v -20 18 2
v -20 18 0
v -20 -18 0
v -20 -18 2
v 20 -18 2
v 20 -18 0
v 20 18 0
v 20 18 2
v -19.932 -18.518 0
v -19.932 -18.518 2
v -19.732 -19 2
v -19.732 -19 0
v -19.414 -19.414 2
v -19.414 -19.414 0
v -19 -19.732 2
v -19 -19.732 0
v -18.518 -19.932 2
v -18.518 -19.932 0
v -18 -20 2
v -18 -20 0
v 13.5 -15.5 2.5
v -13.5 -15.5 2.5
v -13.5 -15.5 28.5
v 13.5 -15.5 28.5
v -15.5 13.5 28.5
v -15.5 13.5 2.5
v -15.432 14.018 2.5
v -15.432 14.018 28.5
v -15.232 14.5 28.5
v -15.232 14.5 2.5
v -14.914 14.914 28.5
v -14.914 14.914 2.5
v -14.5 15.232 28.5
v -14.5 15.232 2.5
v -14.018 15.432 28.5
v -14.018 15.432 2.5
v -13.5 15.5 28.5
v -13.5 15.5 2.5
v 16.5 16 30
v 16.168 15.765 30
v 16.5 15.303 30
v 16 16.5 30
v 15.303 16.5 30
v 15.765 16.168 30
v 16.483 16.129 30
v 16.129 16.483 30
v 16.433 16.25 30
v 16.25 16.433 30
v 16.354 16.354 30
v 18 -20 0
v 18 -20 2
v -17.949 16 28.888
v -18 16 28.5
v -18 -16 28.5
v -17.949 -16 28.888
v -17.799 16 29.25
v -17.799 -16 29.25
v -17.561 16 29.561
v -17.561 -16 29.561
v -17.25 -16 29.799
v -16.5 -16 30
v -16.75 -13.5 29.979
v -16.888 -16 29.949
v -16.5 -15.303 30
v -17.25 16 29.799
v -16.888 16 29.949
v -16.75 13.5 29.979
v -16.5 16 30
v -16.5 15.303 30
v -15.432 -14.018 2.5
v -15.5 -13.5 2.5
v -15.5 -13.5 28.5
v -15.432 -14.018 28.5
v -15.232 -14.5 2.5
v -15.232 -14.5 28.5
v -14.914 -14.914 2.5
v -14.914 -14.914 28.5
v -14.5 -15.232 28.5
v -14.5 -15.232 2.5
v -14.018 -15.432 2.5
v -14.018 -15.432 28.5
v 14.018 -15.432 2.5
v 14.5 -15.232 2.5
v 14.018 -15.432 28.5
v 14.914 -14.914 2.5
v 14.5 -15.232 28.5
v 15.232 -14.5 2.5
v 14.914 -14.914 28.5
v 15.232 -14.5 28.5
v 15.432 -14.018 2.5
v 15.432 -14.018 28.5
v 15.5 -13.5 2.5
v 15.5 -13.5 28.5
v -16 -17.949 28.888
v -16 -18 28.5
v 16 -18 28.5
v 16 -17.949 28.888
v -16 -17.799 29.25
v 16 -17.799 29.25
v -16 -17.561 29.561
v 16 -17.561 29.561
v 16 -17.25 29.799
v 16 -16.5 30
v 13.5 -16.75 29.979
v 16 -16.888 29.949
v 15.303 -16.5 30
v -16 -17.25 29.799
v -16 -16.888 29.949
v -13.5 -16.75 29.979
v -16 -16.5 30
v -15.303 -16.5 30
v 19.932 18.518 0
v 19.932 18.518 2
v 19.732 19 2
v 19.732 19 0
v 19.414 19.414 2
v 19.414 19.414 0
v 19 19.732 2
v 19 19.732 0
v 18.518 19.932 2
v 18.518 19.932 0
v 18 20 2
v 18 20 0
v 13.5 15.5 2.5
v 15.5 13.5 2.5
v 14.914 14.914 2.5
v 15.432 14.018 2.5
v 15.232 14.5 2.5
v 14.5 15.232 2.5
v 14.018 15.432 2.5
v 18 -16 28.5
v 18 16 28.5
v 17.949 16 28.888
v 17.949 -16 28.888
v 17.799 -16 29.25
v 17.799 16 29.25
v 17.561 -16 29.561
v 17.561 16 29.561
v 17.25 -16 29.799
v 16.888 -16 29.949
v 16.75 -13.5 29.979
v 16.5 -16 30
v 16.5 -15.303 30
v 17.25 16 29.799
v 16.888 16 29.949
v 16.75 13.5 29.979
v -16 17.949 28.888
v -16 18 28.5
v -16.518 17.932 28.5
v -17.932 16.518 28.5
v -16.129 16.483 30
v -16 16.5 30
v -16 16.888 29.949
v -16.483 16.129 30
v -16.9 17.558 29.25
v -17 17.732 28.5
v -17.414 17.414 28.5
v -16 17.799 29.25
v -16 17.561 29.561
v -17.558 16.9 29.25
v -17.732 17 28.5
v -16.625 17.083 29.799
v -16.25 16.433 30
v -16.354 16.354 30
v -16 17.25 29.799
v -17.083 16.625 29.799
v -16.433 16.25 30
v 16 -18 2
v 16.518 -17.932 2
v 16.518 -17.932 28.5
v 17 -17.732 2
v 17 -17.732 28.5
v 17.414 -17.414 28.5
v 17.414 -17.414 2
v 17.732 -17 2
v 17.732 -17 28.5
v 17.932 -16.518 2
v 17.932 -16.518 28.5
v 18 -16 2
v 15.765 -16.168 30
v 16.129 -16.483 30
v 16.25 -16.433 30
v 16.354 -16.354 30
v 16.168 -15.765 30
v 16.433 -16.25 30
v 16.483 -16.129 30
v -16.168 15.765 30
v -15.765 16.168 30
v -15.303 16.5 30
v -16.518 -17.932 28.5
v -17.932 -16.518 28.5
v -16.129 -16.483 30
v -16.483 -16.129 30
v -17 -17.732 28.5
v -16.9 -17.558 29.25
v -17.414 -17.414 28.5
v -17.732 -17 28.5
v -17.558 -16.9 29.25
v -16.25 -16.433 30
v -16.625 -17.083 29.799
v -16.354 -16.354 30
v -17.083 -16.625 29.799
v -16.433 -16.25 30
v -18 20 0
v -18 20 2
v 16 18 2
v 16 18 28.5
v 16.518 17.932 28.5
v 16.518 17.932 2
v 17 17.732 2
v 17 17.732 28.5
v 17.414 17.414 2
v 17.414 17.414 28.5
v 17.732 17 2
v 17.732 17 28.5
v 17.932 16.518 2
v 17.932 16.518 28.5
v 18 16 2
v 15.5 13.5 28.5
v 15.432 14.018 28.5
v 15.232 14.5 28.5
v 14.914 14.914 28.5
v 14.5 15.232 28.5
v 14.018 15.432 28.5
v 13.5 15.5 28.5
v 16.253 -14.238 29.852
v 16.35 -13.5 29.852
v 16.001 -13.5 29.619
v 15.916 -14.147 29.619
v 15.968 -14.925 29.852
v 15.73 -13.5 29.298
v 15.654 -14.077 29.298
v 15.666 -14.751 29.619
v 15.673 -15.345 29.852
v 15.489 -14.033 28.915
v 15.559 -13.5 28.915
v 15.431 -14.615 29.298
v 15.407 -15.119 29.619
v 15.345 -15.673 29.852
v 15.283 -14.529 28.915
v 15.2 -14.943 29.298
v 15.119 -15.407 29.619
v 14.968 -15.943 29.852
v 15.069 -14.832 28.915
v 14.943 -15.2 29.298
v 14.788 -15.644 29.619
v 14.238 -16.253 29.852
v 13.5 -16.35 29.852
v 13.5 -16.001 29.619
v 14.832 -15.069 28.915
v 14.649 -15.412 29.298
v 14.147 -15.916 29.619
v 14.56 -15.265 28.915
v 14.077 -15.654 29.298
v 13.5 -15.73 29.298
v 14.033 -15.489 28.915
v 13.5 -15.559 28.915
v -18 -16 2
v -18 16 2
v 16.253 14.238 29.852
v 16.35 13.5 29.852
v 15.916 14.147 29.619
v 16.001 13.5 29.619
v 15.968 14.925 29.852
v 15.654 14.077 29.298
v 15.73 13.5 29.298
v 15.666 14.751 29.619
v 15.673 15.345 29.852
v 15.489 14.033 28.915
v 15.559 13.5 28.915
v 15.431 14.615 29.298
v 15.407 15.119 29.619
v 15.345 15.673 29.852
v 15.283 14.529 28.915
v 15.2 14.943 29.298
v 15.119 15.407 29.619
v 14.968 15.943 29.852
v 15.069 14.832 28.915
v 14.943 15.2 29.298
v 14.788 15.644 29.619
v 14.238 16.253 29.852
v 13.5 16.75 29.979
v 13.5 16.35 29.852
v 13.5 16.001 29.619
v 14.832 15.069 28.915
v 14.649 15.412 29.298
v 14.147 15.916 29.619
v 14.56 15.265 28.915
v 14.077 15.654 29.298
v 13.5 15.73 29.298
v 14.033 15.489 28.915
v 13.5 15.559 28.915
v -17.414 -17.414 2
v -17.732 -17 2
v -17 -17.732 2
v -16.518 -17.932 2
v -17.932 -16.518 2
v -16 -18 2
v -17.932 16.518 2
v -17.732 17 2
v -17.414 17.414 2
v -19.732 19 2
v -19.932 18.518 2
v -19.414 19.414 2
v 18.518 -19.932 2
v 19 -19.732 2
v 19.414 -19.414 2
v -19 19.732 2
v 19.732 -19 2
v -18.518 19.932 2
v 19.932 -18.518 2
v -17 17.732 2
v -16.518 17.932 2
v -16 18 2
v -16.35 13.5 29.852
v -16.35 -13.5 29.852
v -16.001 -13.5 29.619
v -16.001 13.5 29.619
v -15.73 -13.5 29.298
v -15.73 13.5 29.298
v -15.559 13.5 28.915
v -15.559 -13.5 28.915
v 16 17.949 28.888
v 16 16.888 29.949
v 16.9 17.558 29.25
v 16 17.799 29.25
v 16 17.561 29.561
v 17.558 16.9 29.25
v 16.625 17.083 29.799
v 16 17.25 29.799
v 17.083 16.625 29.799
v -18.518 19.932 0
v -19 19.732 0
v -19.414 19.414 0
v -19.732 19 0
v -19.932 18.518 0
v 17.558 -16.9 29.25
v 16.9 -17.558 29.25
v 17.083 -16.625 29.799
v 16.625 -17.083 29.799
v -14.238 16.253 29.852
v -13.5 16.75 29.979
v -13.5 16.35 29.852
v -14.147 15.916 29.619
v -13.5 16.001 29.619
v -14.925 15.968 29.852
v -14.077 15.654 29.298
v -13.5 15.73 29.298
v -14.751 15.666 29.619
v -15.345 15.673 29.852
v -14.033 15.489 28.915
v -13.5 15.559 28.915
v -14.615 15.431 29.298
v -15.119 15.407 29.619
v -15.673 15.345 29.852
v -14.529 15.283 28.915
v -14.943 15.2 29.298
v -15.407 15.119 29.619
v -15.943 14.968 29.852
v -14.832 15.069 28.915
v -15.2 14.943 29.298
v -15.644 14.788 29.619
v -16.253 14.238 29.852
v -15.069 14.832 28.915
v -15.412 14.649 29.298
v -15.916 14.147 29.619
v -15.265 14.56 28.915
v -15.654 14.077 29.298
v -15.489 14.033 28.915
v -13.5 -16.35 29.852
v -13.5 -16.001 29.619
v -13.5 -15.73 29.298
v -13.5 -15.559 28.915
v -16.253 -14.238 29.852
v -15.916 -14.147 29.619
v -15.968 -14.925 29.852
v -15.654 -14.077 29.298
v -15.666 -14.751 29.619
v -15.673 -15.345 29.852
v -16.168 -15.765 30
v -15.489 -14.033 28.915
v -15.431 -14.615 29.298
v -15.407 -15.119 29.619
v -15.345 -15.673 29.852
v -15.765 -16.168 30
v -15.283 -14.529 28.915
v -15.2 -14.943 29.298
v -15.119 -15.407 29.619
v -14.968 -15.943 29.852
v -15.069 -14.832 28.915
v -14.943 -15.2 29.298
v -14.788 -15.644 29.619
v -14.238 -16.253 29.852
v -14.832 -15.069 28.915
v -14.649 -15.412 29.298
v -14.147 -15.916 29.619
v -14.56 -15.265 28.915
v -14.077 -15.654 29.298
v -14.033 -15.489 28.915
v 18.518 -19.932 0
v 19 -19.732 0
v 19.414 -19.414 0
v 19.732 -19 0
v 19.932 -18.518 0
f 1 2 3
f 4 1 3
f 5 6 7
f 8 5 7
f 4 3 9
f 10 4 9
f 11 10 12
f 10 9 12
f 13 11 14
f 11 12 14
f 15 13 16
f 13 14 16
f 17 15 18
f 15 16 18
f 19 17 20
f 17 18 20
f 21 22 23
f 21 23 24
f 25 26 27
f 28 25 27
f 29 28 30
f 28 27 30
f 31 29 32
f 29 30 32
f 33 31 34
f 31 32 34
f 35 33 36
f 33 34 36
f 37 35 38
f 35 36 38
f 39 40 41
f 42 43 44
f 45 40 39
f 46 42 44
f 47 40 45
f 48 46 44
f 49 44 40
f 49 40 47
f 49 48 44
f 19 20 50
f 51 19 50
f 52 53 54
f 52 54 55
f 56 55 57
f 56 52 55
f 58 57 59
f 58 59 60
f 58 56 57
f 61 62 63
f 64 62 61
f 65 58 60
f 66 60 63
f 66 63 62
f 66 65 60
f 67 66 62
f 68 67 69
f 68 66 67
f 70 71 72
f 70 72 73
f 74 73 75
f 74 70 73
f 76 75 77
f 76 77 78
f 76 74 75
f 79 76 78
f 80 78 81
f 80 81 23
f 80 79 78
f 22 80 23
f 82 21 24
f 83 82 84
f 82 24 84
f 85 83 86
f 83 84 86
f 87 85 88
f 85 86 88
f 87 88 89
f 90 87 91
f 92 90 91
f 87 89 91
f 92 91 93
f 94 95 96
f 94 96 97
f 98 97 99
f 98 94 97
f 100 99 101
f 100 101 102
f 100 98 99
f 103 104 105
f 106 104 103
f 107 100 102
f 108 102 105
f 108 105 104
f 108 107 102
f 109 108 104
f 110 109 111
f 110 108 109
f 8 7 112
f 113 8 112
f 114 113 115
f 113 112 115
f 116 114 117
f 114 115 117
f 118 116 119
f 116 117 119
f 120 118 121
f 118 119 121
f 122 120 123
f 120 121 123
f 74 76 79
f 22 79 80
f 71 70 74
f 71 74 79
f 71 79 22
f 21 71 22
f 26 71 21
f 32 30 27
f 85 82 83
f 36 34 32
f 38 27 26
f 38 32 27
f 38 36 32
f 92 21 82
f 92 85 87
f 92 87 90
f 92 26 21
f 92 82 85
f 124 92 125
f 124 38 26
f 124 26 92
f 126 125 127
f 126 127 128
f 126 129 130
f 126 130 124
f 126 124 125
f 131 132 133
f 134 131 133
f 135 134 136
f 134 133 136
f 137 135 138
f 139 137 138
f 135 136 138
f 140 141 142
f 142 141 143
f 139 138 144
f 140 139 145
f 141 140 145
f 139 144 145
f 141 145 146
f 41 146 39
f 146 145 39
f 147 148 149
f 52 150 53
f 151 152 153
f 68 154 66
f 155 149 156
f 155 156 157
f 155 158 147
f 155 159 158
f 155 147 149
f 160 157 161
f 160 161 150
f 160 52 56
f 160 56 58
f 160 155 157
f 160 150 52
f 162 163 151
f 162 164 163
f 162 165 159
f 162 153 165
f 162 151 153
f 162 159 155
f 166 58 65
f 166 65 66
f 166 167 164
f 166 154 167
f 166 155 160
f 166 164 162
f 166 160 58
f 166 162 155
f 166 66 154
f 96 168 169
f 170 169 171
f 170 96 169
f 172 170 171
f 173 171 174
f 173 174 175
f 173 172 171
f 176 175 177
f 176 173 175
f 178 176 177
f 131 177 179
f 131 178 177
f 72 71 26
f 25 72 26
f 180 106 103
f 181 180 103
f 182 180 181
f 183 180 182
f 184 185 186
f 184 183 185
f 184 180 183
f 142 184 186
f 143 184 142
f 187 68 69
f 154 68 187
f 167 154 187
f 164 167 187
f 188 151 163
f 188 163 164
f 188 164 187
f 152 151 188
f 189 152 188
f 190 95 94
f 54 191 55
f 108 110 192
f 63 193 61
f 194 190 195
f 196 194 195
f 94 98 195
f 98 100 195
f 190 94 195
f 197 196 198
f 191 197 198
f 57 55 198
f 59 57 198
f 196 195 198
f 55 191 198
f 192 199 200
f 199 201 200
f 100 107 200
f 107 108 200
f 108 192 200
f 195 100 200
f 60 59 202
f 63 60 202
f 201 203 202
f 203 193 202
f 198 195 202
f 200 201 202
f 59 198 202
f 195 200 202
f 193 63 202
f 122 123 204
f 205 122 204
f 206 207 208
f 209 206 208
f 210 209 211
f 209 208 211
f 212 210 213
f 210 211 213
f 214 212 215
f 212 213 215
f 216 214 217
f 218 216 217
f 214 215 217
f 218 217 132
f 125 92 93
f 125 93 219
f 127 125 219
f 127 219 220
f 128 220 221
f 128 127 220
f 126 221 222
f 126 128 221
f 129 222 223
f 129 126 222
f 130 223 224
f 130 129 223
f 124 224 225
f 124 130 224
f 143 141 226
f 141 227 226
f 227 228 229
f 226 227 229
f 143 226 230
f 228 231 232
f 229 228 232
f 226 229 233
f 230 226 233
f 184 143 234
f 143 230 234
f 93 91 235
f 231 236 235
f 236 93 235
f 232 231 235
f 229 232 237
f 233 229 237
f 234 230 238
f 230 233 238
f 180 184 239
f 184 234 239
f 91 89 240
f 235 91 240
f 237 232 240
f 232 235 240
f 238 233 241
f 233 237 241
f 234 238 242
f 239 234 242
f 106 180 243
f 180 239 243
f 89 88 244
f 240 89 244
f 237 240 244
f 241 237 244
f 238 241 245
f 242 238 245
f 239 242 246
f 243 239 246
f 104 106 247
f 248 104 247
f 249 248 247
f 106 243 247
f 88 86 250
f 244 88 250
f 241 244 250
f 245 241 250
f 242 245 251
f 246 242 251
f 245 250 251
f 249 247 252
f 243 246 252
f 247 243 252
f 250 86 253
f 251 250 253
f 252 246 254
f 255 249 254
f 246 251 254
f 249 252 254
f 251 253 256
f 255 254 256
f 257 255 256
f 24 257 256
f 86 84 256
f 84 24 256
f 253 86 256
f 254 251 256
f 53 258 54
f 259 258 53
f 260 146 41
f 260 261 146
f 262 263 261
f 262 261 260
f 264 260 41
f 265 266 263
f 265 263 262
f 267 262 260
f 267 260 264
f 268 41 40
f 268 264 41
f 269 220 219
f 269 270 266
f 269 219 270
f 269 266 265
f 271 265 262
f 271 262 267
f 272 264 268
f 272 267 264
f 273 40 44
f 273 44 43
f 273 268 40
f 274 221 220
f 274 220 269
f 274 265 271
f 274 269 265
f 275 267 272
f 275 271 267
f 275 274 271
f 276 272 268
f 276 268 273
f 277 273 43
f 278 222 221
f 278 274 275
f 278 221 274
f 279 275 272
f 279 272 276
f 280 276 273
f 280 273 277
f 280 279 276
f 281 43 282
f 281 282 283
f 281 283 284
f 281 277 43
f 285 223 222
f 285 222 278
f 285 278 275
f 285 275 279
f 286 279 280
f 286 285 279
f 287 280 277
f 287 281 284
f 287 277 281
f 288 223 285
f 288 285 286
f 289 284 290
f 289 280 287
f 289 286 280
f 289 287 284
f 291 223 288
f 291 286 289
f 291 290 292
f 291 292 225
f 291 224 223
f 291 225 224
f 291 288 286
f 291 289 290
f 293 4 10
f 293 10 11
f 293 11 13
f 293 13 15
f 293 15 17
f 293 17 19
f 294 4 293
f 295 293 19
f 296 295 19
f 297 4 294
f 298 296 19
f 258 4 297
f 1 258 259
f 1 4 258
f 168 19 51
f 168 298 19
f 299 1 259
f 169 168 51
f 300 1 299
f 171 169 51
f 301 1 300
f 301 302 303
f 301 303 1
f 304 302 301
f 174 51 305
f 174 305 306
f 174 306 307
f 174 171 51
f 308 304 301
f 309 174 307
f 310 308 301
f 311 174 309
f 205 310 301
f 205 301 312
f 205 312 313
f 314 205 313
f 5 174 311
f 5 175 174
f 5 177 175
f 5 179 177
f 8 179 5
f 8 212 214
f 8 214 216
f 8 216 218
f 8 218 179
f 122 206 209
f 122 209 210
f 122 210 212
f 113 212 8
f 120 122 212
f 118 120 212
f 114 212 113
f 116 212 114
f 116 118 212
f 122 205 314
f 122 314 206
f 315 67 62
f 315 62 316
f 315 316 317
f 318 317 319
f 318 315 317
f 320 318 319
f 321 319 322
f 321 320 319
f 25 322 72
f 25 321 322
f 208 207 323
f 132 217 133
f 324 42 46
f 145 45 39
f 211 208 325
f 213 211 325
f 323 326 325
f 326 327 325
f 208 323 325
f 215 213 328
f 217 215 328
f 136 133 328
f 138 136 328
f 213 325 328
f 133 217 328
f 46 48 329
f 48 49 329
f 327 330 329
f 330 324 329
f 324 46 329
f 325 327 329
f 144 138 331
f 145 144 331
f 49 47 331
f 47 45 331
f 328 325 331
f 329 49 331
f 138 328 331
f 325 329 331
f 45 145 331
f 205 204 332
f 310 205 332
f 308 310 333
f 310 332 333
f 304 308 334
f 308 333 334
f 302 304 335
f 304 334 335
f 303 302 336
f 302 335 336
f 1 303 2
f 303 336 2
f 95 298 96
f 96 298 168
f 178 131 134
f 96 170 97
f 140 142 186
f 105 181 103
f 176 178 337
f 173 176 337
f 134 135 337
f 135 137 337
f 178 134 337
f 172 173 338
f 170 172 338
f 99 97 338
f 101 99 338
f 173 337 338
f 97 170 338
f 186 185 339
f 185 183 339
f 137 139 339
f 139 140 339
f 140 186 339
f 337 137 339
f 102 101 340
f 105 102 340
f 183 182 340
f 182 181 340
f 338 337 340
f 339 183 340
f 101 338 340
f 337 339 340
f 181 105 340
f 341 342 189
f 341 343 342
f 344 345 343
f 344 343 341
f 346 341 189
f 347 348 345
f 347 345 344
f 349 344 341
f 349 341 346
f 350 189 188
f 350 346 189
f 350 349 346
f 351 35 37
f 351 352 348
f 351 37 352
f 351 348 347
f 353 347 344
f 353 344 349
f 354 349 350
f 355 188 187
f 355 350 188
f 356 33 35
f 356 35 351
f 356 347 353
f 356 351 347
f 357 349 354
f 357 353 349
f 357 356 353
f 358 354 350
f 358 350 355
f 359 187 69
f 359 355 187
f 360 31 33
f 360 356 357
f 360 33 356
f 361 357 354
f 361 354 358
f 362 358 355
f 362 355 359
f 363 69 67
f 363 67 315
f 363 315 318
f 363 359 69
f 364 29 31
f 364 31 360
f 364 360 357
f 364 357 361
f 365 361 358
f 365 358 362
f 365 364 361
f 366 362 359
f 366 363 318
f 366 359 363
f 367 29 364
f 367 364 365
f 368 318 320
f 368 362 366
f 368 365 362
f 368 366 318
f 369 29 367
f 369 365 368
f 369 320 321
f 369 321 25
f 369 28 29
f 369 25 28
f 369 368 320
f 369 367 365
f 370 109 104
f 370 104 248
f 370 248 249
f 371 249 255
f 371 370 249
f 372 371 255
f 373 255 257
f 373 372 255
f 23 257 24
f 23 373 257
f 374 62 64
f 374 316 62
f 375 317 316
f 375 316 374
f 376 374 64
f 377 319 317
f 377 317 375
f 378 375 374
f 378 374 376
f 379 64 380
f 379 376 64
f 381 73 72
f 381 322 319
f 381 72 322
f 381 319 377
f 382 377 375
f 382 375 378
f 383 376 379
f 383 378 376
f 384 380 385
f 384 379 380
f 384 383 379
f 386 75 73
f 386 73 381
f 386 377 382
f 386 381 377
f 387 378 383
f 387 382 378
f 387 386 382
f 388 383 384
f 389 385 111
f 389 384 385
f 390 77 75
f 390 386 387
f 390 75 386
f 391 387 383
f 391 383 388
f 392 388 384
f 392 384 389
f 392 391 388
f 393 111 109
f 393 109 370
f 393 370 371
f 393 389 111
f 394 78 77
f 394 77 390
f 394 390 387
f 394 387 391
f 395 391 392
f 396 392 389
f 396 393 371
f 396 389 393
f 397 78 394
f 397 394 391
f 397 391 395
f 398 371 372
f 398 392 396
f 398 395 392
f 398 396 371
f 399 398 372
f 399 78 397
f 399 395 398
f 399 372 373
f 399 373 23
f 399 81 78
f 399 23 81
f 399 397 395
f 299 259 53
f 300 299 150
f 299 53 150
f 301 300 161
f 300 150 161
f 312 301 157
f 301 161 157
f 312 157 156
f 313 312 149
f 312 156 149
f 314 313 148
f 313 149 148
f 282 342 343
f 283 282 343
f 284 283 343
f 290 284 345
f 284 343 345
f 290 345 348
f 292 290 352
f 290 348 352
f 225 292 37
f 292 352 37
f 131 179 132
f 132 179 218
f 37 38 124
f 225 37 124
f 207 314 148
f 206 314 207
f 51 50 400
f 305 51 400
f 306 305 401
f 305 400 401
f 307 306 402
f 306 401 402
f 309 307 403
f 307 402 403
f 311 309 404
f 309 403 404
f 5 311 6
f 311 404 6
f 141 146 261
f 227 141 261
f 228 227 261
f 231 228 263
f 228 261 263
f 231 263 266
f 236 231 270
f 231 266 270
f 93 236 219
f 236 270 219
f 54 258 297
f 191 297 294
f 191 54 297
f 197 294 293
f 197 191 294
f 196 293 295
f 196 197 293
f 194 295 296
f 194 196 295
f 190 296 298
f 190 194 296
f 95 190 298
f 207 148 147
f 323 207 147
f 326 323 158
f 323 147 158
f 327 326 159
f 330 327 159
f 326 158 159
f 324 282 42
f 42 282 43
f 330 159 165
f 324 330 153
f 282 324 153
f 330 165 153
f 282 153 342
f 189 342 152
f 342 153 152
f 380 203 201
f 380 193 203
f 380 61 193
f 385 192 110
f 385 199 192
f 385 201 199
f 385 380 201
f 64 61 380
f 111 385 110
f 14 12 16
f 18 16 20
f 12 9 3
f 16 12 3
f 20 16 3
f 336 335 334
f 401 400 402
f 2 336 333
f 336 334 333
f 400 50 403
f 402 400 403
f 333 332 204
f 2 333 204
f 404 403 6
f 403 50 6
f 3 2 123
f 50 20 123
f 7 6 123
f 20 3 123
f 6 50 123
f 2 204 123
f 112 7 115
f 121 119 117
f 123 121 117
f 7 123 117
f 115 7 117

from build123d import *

# Parameters (mm, degrees)
F0_W         = 36
F0_H         = 36
F1_DEPTH     = 2
F2_DEPTH     = 30
F3_T         = -2.5
F4_R         = 2
F5_T1_DEPTH  = 32
F5_T3_DEPTH  = 27
F5_T5_DEPTH  = 32
F5_T7_DEPTH  = 27
F5_T10_ANGLE = 90
F5_T12_ANGLE = 90
F5_T14_ANGLE = 90
F5_T16_ANGLE = 90
F5_T18_ANGLE = 90
F5_T20_ANGLE = 90
F5_T22_ANGLE = 90
F5_T24_ANGLE = 90


# Not quite as in the source:
# - a fillet or chamfer that OpenCascade refuses, or shapes differently, is made with other operations: its cross-section is extruded or revolved along the edge and cut away or added


with BuildPart() as f1:
    # F0 (on Top) → F1 (new body)
    with BuildSketch(Plane.XY):
        with BuildLine():
            ThreePointArc((20, 18), (19.4142135624, 19.4142135624), (18, 20))
            Line((18, 20), (-18, 20))
            ThreePointArc((-18, 20), (-19.4142135624, 19.4142135624), (-20, 18))
            Line((-20, 18), (-20, -18))
            ThreePointArc((-20, -18), (-19.4142135624, -19.4142135624), (-18, -20))
            Line((-18, -20), (18, -20))
            ThreePointArc((18, -20), (19.4142135624, -19.4142135624), (20, -18))
            Line((20, -18), (20, 18))
        make_face()
        Rectangle(F0_W, F0_H, mode=Mode.SUBTRACT)
    extrude(amount=F1_DEPTH)

    # F0 (on Top) → F2 (join)
    with BuildSketch(Plane.XY):
        Rectangle(F0_W, F0_H)
    extrude(amount=F2_DEPTH)

    # F3
    f3_openings = [f1.faces().sort_by_distance(p)[0] for p in [
        (0, 0, 30),
    ]]
    offset(amount=F3_T, openings=f3_openings)

    # F4
    f4_edges = [f1.edges().sort_by_distance(p)[0] for p in [
        (-18, -18, 16),
        (18, 18, 16),
        (-18, 18, 16),
        (18, -18, 16),
        (-15.5, -15.5, 16.25),
        (15.5, -15.5, 16.25),
        (15.5, 15.5, 16.25),
        (-15.5, 15.5, 16.25),
    ]]
    fillet(f4_edges, radius=F4_R)

    # F5: fillet of radius 1.5 on 16 edges, made by hand

    # F5_s2 → F5_t1 (cut)
    with BuildSketch(Plane.XZ.offset(-16)):
        with BuildLine():
            ThreePointArc((-18, 28.5), (-17.5606601718, 29.5606601718), (-16.5, 30))
            Line((-16.5, 30), (-18, 30))
            Line((-18, 30), (-18, 28.5))
        make_face()
        with BuildLine():
            ThreePointArc((18, 28.5), (17.5606601718, 29.5606601718), (16.5, 30))
            Line((16.5, 30), (18, 30))
            Line((18, 30), (18, 28.5))
        make_face()
    extrude(amount=F5_T1_DEPTH, mode=Mode.SUBTRACT)

    # F5_s4 → F5_t3 (cut)
    with BuildSketch(Plane.XZ.offset(-13.5)):
        with BuildLine():
            ThreePointArc((-17, 30), (-15.9393398282, 29.5606601718), (-15.5, 28.5))
            Line((-15.5, 28.5), (-15.5, 30))
            Line((-15.5, 30), (-17, 30))
        make_face()
        with BuildLine():
            ThreePointArc((17, 30), (15.9393398282, 29.5606601718), (15.5, 28.5))
            Line((15.5, 28.5), (15.5, 30))
            Line((15.5, 30), (17, 30))
        make_face()
    extrude(amount=F5_T3_DEPTH, mode=Mode.SUBTRACT)

    # F5_s6 → F5_t5 (cut)
    with BuildSketch(Plane.YZ.offset(-16)):
        with BuildLine():
            ThreePointArc((18, 28.5), (17.5606601718, 29.5606601718), (16.5, 30))
            Line((16.5, 30), (18, 30))
            Line((18, 30), (18, 28.5))
        make_face()
        with BuildLine():
            ThreePointArc((-18, 28.5), (-17.5606601718, 29.5606601718), (-16.5, 30))
            Line((-16.5, 30), (-18, 30))
            Line((-18, 30), (-18, 28.5))
        make_face()
    extrude(amount=F5_T5_DEPTH, mode=Mode.SUBTRACT)

    # F5_s8 → F5_t7 (cut)
    with BuildSketch(Plane.YZ.offset(-13.5)):
        with BuildLine():
            ThreePointArc((-17, 30), (-15.9393398282, 29.5606601718), (-15.5, 28.5))
            Line((-15.5, 28.5), (-15.5, 30))
            Line((-15.5, 30), (-17, 30))
        make_face()
        with BuildLine():
            ThreePointArc((17, 30), (15.9393398282, 29.5606601718), (15.5, 28.5))
            Line((15.5, 28.5), (15.5, 30))
            Line((15.5, 30), (17, 30))
        make_face()
    extrude(amount=F5_T7_DEPTH, mode=Mode.SUBTRACT)

    # F5_s9 → F5_t10 (revolve, cut)
    with BuildSketch(Plane.YZ.offset(-16)):
        with BuildLine():
            ThreePointArc((18, 28.5), (17.5606601718, 29.5606601718), (16.5, 30))
            Line((16.5, 30), (18, 30))
            Line((18, 30), (18, 28.5))
        make_face()
    revolve(axis=Axis((-16, 16, 30), (0, 0, 1)), revolution_arc=F5_T10_ANGLE, mode=Mode.SUBTRACT)

    # F5_s11 → F5_t12 (revolve, cut)
    with BuildSketch(Plane.YZ.offset(16)):
        with BuildLine():
            ThreePointArc((18, 28.5), (17.5606601718, 29.5606601718), (16.5, 30))
            Line((16.5, 30), (18, 30))
            Line((18, 30), (18, 28.5))
        make_face()
    revolve(axis=Axis((16, 16, 30), (0, 0, -1)), revolution_arc=F5_T12_ANGLE, mode=Mode.SUBTRACT)

    # F5_s13 → F5_t14 (revolve, cut)
    with BuildSketch(Plane.YZ.offset(-16)):
        with BuildLine():
            ThreePointArc((-18, 28.5), (-17.5606601718, 29.5606601718), (-16.5, 30))
            Line((-16.5, 30), (-18, 30))
            Line((-18, 30), (-18, 28.5))
        make_face()
    revolve(axis=Axis((-16, -16, 30), (0, 0, -1)), revolution_arc=F5_T14_ANGLE, mode=Mode.SUBTRACT)

    # F5_s15 → F5_t16 (revolve, cut)
    with BuildSketch(Plane.XZ.offset(16)):
        with BuildLine():
            ThreePointArc((18, 28.5), (17.5606601718, 29.5606601718), (16.5, 30))
            Line((16.5, 30), (18, 30))
            Line((18, 30), (18, 28.5))
        make_face()
    revolve(axis=Axis((16, -16, 30), (0, 0, -1)), revolution_arc=F5_T16_ANGLE, mode=Mode.SUBTRACT)

    # F5_s17 → F5_t18 (revolve, cut)
    with BuildSketch(Plane.XZ.offset(13.5)):
        with BuildLine():
            ThreePointArc((17, 30), (15.9393398282, 29.5606601718), (15.5, 28.5))
            Line((15.5, 28.5), (15.5, 30))
            Line((15.5, 30), (17, 30))
        make_face()
    revolve(axis=Axis((13.5, -13.5, 30), (0, 0, -1)), revolution_arc=F5_T18_ANGLE, mode=Mode.SUBTRACT)

    # F5_s19 → F5_t20 (revolve, cut)
    with BuildSketch(Plane.XZ.offset(-13.5)):
        with BuildLine():
            ThreePointArc((17, 30), (15.9393398282, 29.5606601718), (15.5, 28.5))
            Line((15.5, 28.5), (15.5, 30))
            Line((15.5, 30), (17, 30))
        make_face()
    revolve(axis=Axis((13.5, 13.5, 30), (0, 0, 1)), revolution_arc=F5_T20_ANGLE, mode=Mode.SUBTRACT)

    # F5_s21 → F5_t22 (revolve, cut)
    with BuildSketch(Plane.XZ.offset(13.5)):
        with BuildLine():
            ThreePointArc((-17, 30), (-15.9393398282, 29.5606601718), (-15.5, 28.5))
            Line((-15.5, 28.5), (-15.5, 30))
            Line((-15.5, 30), (-17, 30))
        make_face()
    revolve(axis=Axis((-13.5, -13.5, 30), (0, 0, 1)), revolution_arc=F5_T22_ANGLE, mode=Mode.SUBTRACT)

    # F5_s23 → F5_t24 (revolve, cut)
    with BuildSketch(Plane.YZ.offset(-13.5)):
        with BuildLine():
            ThreePointArc((17, 30), (15.9393398282, 29.5606601718), (15.5, 28.5))
            Line((15.5, 28.5), (15.5, 30))
            Line((15.5, 30), (17, 30))
        make_face()
    revolve(axis=Axis((-13.5, 13.5, 30), (0, 0, 1)), revolution_arc=F5_T24_ANGLE, mode=Mode.SUBTRACT)


solid = f1.part
